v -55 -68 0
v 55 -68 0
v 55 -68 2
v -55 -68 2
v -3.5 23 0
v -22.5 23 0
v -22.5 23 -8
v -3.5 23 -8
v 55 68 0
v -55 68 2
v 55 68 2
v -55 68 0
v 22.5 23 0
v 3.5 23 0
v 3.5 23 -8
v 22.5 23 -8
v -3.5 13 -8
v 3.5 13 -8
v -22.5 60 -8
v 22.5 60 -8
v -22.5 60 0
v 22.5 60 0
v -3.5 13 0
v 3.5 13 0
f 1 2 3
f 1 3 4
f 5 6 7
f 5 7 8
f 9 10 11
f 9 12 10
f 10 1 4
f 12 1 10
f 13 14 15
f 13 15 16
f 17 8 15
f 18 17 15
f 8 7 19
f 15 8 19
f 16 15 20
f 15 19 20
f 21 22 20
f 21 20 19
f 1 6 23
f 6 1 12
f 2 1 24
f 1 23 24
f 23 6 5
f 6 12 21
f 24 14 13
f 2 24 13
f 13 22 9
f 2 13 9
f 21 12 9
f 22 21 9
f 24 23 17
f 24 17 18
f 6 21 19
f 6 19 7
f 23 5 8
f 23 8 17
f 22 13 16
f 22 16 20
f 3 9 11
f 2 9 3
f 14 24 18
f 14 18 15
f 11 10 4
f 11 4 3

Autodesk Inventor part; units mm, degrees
ref_plane "YZ Plane" through (0, 0, 0) normal (1, 0, 0) x (0, 1, 0)
ref_plane "XZ Plane" through (0, 0, 0) normal (0, 1, 0) x (-1, 0, 0)
ref_plane "XY Plane" through (0, 0, 0) normal (0, 0, 1) x (1, 0, 0)
sketch "Skizze1" plane through (0, 0, 0) normal (0, 0, 1) x (1, 0, 0)
  line L0 (55, -68) -> (-55, -68)
  line L1 (-55, -68) -> (-55, 68)
  line L2 (-55, 68) -> (55, 68)
  line L3 (55, 68) -> (55, -68)
  line L4 (55, -68) -> (-55, 68) construction
  line L5 (-55, -68) -> (55, 68) construction
  point P0 (0, 0)
  dimension "d0" = 110
  dimension "d1" = 136
extrude "Extrusion1" add sketch "Skizze1" along normal blind 2
sketch "Skizze2" plane through (0, 0, 0) normal (0, 0, 1) x (1, 0, 0)
  line L0 (-22.5, 23) -> (22.5, 23)
  line L1 (22.5, 23) -> (22.5, 60)
  line L2 (22.5, 60) -> (-22.5, 60)
  line L3 (-22.5, 60) -> (-22.5, 23)
  line L4 (-22.5, 23) -> (22.5, 60) construction
  line L5 (22.5, 23) -> (-22.5, 60) construction
  line L6 (55, 68) -> (-55, 68) projected
  line L7 (-3.5, 13) -> (3.5, 13)
  line L8 (3.5, 13) -> (3.5, 23)
  line L9 (3.5, 23) -> (-3.5, 23)
  line L10 (-3.5, 23) -> (-3.5, 13)
  line L11 (-3.5, 13) -> (3.5, 23) construction
  line L12 (3.5, 13) -> (-3.5, 23) construction
  point P0 (0, 0)
  point P1 (0, 41.5)
  point P2 (0, 18)
  dimension "d4" = 45
  dimension "d5" = 37
  dimension "d6" = 8
  dimension "d7" = 7
  dimension "d8" = 10
extrude "Extrusion2" add sketch "Skizze2" against normal blind 8
equation "\"d0\" = SolarPanelWidth"
equation "\"d1\" = SolarPanelHeight"
equation "\"d2\" = SolarPanelThickness"
equation "\"d4\" = SolarPanelConnectorWidth"
equation "\"d5\" = SolarPanelConnectorHeight"
equation "\"d9\" = SolarPanelConnectorDepth"
equation "\"SolarPanelWidth\" = 110"
equation "\"SolarPanelHeight\" = 136"
equation "\"SolarPanelThickness\" = 2"
equation "\"SolarPanelConnectorWidth\" = 45"
equation "\"SolarPanelConnectorHeight\" = 37"
equation "\"SolarPanelConnectorDepth\" = 8"
properties part number "SolarPanel"
